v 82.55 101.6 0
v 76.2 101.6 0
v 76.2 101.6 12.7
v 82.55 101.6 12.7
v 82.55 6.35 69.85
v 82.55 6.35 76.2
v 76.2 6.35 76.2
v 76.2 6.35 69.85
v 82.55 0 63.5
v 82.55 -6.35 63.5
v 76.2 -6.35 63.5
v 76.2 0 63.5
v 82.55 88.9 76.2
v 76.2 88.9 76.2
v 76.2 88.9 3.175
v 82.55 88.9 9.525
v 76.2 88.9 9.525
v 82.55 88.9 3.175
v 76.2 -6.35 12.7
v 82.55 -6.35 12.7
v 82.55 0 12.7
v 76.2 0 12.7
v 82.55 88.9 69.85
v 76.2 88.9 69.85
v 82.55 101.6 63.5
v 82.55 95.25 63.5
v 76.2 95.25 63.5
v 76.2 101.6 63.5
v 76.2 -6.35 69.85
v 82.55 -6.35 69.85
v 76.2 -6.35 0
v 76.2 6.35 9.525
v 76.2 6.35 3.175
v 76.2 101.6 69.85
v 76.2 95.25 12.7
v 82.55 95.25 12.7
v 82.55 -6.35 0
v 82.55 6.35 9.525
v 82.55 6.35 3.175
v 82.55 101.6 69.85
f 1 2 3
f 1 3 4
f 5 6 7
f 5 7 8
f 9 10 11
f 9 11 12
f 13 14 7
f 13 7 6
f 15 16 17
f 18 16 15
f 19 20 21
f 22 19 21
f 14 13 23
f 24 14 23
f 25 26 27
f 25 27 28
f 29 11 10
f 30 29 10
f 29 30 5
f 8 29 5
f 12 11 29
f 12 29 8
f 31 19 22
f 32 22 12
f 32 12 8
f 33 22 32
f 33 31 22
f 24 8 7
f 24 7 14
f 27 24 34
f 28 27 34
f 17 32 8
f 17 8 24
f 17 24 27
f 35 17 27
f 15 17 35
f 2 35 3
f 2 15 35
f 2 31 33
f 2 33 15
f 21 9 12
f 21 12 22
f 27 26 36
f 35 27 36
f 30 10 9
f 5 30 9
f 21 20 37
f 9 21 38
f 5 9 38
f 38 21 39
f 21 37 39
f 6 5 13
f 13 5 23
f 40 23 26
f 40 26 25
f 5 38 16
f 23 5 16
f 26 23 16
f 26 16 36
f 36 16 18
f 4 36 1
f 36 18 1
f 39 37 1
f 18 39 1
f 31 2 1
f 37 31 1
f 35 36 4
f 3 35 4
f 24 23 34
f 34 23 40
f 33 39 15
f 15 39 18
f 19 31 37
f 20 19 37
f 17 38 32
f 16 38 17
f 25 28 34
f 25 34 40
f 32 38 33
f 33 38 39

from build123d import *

# Parameters (mm, degrees)
SKETCH1_W           = 6.35
SKETCH1_H           = 107.95
BOSS_EXTRUDE1_DEPTH = 76.2
SKETCH2_W           = 6.35
SKETCH2_H           = 12.7
SKETCH2_W_2         = 50.8
SKETCH2_H_2         = 6.35
SKETCH2_H_3         = 82.55
CUT_EXTRUDE1_DEPTH  = 128.158650905


with BuildPart() as part:
    # Sketch1 → Boss-Extrude1 (new body)
    with BuildSketch(Plane.XY):
        with Locations((79.375, 47.625)):
            Rectangle(SKETCH1_W, SKETCH1_H)
    extrude(amount=BOSS_EXTRUDE1_DEPTH)

    # Sketch2 → Cut-Extrude1 (cut, through all)
    with BuildSketch(Plane(origin=(82.55, 0, 0), x_dir=(0, 0, -1), z_dir=(1, 0, 0))):
        with Locations((-73.025, 95.25)):
            Rectangle(SKETCH2_W, SKETCH2_H)
        with Locations((-73.025, 0)):
            Rectangle(SKETCH2_W, SKETCH2_H)
        with Locations((-38.1, 98.425)):
            Rectangle(SKETCH2_W_2, SKETCH2_H_2)
        with Locations((-6.35, 47.625)):
            Rectangle(SKETCH2_W, SKETCH2_H_3)
        with Locations((-38.1, -3.175)):
            Rectangle(SKETCH2_W_2, SKETCH2_H_2)
    extrude(amount=-CUT_EXTRUDE1_DEPTH, mode=Mode.SUBTRACT)


solid = part.part
